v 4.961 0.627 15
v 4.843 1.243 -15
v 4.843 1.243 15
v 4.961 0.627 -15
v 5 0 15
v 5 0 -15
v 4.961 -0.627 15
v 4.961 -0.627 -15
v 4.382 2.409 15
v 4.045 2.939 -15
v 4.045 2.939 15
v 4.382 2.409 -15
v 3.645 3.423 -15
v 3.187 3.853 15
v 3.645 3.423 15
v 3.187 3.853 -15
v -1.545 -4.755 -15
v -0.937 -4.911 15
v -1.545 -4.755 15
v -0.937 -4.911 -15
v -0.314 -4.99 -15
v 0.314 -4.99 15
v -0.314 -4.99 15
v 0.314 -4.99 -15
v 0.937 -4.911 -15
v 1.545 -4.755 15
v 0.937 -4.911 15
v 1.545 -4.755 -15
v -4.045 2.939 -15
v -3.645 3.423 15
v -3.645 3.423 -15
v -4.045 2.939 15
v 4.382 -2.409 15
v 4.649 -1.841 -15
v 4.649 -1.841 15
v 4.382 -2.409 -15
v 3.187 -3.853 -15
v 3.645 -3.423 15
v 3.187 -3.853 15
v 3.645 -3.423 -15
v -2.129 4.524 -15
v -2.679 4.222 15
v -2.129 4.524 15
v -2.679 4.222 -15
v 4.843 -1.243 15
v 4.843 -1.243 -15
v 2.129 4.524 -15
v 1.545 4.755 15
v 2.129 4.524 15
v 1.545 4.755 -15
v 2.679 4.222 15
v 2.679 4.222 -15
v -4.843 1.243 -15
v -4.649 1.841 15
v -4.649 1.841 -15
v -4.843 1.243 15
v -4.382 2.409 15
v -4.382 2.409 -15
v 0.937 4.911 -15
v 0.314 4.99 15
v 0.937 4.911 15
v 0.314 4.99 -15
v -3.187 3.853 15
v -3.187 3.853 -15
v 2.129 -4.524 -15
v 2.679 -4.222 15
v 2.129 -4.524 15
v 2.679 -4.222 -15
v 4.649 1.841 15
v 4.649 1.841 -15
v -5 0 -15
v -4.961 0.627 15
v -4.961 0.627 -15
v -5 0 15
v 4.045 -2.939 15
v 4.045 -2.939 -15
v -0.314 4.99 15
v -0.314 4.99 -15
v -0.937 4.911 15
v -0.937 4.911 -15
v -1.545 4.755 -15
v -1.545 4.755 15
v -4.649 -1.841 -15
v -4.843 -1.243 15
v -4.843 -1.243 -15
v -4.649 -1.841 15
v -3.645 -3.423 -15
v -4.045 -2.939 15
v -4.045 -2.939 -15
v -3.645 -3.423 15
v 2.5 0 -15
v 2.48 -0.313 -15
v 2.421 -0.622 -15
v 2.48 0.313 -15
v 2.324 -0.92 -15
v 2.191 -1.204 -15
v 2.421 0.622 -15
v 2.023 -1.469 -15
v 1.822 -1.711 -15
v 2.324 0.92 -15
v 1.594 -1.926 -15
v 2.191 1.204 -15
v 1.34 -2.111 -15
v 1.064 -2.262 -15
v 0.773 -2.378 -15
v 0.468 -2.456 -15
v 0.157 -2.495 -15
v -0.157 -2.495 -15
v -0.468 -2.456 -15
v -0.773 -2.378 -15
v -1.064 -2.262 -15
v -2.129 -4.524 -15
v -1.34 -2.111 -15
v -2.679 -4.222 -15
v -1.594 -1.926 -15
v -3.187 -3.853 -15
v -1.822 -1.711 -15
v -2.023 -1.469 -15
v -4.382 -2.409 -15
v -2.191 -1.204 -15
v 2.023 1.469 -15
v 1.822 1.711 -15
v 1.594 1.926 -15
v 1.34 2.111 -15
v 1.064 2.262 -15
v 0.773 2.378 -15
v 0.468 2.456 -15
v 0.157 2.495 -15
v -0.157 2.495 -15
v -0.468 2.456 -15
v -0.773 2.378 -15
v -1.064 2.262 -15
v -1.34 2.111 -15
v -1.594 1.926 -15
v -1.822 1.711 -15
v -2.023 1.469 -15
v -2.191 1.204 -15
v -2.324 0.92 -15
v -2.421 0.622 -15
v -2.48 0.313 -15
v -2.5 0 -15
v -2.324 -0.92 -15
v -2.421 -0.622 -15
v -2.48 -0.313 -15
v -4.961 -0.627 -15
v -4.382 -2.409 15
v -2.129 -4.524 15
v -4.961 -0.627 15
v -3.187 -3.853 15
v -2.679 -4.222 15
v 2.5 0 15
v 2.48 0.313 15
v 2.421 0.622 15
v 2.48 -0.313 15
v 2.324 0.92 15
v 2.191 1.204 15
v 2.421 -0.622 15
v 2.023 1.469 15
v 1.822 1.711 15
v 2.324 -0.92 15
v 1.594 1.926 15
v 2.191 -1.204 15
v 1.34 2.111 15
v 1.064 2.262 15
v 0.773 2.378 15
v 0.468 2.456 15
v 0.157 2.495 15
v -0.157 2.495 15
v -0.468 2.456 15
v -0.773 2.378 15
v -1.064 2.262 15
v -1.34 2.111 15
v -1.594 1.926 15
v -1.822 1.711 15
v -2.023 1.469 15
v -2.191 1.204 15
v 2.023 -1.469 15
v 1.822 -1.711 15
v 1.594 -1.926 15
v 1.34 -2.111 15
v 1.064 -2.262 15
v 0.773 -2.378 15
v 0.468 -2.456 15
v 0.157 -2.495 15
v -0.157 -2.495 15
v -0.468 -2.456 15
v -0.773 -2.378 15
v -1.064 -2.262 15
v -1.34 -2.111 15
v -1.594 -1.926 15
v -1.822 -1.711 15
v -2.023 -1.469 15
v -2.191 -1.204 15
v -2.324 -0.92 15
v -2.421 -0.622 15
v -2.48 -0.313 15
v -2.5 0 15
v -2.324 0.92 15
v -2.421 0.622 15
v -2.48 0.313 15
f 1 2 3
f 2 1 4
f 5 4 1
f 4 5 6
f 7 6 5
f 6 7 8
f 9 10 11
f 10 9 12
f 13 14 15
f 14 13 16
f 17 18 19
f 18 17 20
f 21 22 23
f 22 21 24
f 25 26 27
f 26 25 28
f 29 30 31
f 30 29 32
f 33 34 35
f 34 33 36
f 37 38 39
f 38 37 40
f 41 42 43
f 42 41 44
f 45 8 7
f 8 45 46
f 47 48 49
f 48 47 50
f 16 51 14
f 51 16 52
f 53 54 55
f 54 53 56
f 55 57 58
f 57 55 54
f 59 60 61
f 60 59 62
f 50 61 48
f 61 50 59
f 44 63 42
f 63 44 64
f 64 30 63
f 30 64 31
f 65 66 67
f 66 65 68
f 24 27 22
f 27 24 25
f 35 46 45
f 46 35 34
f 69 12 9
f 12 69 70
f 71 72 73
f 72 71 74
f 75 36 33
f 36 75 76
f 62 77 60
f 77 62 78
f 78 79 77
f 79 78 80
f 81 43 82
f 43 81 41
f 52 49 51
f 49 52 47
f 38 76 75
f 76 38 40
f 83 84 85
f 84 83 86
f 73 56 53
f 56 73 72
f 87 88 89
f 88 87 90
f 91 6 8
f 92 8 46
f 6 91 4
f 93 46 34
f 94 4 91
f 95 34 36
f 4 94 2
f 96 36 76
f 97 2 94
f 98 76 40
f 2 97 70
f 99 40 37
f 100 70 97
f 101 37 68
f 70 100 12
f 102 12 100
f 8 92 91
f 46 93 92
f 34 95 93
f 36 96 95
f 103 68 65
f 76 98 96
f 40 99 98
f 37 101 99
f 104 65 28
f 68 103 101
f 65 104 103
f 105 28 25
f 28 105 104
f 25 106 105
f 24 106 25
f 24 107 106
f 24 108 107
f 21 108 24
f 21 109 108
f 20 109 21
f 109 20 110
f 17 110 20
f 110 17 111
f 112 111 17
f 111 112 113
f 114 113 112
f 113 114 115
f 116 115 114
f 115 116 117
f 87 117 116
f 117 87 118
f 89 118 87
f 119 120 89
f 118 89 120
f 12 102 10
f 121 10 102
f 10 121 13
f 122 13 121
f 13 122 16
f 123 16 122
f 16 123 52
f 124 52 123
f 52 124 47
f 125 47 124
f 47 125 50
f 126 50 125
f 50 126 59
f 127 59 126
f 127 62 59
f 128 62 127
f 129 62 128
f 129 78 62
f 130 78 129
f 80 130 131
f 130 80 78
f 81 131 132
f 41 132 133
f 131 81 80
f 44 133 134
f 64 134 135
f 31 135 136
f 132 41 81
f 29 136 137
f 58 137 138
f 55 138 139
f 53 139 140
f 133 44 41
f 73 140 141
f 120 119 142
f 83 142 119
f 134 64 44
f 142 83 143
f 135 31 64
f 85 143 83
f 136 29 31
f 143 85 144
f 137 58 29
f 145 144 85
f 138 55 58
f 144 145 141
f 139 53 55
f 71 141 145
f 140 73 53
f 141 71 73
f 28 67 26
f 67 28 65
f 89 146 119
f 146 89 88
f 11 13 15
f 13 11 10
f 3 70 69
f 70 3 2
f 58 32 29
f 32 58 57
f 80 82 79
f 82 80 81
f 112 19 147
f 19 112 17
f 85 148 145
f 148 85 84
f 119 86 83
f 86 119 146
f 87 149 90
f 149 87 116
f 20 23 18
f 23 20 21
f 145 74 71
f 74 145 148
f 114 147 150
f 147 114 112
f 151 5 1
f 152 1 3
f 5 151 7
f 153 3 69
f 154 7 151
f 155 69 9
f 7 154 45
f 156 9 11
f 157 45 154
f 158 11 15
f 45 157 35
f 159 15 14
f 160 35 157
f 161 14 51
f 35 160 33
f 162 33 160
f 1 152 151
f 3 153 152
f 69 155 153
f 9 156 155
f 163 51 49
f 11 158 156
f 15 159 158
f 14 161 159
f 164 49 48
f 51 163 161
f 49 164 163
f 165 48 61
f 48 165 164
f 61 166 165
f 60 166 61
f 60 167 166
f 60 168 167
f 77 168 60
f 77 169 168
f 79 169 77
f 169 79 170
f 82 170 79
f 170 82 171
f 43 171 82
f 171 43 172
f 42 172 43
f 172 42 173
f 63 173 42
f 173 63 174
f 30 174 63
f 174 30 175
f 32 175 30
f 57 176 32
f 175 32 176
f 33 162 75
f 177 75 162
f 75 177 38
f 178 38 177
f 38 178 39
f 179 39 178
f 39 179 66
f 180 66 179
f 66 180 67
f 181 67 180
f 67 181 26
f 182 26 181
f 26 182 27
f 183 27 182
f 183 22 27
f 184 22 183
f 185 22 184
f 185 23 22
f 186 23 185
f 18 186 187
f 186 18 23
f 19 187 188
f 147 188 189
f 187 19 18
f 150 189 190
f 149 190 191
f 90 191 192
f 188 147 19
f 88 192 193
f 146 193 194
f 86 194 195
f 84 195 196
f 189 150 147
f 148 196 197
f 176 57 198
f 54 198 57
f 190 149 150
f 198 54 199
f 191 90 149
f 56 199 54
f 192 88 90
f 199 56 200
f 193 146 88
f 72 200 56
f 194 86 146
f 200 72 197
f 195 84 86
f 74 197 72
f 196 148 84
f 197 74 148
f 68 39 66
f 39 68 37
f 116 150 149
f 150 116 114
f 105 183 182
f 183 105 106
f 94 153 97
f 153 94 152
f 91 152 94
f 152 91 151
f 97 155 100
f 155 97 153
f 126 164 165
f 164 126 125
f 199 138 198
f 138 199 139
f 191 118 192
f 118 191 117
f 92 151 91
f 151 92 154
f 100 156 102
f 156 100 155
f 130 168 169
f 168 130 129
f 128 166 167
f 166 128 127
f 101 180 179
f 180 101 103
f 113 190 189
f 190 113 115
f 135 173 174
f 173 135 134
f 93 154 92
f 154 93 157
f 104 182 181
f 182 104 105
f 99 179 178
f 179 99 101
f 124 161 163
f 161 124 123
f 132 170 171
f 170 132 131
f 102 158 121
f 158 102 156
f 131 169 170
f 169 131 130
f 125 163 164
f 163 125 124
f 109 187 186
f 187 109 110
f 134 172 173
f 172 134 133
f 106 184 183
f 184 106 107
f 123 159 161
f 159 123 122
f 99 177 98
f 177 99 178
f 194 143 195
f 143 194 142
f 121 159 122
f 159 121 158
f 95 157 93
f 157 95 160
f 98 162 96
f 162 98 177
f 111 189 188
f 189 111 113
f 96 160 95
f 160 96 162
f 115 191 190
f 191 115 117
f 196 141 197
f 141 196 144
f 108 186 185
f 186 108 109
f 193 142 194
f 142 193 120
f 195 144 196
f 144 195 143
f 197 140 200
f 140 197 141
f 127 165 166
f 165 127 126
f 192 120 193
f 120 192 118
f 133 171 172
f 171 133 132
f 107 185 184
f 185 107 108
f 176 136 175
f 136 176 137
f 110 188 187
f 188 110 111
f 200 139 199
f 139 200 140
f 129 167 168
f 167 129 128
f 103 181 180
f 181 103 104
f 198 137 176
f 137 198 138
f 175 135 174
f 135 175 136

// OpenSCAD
$fn = 50;


difference() {
	union() {
		translate(v = [0, 0, -15.0000000000]) {
			cylinder(h = 30, r = 5.0000000000);
		}
	}
	union() {
		translate(v = [0, 0, -100.0000000000]) {
			cylinder(h = 200, r = 2.5000000000);
		}
	}
}
